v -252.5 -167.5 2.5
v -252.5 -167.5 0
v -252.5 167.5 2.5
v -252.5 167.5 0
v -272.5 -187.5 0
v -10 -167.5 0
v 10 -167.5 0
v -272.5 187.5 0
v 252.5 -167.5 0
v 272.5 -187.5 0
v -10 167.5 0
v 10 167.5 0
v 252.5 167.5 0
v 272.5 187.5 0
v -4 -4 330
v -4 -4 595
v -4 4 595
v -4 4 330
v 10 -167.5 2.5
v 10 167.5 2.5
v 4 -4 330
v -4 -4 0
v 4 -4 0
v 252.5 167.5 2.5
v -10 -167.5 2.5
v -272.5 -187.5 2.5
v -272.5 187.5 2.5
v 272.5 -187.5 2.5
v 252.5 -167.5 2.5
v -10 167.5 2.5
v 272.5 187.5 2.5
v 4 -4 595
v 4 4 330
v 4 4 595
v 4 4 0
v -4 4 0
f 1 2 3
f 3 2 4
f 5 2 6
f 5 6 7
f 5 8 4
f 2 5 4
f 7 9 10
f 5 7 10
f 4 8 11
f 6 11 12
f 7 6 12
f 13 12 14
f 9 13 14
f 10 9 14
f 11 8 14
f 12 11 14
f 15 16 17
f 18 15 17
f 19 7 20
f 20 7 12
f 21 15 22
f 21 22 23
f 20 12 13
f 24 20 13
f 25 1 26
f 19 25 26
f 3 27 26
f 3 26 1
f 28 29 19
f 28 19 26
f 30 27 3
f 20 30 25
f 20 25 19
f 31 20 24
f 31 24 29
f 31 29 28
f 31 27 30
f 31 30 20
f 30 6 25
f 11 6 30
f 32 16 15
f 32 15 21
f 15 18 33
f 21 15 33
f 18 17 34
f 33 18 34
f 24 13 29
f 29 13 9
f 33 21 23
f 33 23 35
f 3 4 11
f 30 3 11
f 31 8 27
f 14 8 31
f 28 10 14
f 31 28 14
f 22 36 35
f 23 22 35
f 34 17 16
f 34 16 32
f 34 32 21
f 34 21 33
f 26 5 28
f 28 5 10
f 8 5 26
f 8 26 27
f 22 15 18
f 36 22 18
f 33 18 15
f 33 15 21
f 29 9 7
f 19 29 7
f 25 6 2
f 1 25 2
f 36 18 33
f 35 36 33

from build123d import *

# Parameters (mm, degrees)
F0_W      = 545
F0_H      = 375
F0_W_2    = 20
F0_H_2    = 335
F1_DEPTH  = 2.5
F2_W      = 8
F2_H      = 8
F3_DEPTH  = 330
F3_FACE_W = 8
F3_FACE_H = 8
F4_DEPTH  = 265


with BuildPart() as f1:
    # F0 (on Top) → F1 (new body)
    with BuildSketch(Plane.XY):
        Rectangle(F0_W, F0_H)
        Polygon((252.5, 167.5), (252.5, -167.5), (10, -167.5), (-10, -167.5), (-252.5, -167.5), (-252.5, 167.5), (-10, 167.5), (10, 167.5), align=None, mode=Mode.SUBTRACT)
        Rectangle(F0_W_2, F0_H_2)
    extrude(amount=F1_DEPTH)


with BuildPart() as f3:
    # F2 (on Top) → F3 (new body)
    with BuildSketch(Plane.XY):
        Rectangle(F2_W, F2_H)
    extrude(amount=F3_DEPTH)


with BuildPart() as f4:
    # F3_face (on face) → F4 (new body)
    with BuildSketch(Plane.XY.offset(330)):
        Rectangle(F3_FACE_W, F3_FACE_H)
    extrude(amount=F4_DEPTH)


solid = Compound([f1.part, f3.part, f4.part])
